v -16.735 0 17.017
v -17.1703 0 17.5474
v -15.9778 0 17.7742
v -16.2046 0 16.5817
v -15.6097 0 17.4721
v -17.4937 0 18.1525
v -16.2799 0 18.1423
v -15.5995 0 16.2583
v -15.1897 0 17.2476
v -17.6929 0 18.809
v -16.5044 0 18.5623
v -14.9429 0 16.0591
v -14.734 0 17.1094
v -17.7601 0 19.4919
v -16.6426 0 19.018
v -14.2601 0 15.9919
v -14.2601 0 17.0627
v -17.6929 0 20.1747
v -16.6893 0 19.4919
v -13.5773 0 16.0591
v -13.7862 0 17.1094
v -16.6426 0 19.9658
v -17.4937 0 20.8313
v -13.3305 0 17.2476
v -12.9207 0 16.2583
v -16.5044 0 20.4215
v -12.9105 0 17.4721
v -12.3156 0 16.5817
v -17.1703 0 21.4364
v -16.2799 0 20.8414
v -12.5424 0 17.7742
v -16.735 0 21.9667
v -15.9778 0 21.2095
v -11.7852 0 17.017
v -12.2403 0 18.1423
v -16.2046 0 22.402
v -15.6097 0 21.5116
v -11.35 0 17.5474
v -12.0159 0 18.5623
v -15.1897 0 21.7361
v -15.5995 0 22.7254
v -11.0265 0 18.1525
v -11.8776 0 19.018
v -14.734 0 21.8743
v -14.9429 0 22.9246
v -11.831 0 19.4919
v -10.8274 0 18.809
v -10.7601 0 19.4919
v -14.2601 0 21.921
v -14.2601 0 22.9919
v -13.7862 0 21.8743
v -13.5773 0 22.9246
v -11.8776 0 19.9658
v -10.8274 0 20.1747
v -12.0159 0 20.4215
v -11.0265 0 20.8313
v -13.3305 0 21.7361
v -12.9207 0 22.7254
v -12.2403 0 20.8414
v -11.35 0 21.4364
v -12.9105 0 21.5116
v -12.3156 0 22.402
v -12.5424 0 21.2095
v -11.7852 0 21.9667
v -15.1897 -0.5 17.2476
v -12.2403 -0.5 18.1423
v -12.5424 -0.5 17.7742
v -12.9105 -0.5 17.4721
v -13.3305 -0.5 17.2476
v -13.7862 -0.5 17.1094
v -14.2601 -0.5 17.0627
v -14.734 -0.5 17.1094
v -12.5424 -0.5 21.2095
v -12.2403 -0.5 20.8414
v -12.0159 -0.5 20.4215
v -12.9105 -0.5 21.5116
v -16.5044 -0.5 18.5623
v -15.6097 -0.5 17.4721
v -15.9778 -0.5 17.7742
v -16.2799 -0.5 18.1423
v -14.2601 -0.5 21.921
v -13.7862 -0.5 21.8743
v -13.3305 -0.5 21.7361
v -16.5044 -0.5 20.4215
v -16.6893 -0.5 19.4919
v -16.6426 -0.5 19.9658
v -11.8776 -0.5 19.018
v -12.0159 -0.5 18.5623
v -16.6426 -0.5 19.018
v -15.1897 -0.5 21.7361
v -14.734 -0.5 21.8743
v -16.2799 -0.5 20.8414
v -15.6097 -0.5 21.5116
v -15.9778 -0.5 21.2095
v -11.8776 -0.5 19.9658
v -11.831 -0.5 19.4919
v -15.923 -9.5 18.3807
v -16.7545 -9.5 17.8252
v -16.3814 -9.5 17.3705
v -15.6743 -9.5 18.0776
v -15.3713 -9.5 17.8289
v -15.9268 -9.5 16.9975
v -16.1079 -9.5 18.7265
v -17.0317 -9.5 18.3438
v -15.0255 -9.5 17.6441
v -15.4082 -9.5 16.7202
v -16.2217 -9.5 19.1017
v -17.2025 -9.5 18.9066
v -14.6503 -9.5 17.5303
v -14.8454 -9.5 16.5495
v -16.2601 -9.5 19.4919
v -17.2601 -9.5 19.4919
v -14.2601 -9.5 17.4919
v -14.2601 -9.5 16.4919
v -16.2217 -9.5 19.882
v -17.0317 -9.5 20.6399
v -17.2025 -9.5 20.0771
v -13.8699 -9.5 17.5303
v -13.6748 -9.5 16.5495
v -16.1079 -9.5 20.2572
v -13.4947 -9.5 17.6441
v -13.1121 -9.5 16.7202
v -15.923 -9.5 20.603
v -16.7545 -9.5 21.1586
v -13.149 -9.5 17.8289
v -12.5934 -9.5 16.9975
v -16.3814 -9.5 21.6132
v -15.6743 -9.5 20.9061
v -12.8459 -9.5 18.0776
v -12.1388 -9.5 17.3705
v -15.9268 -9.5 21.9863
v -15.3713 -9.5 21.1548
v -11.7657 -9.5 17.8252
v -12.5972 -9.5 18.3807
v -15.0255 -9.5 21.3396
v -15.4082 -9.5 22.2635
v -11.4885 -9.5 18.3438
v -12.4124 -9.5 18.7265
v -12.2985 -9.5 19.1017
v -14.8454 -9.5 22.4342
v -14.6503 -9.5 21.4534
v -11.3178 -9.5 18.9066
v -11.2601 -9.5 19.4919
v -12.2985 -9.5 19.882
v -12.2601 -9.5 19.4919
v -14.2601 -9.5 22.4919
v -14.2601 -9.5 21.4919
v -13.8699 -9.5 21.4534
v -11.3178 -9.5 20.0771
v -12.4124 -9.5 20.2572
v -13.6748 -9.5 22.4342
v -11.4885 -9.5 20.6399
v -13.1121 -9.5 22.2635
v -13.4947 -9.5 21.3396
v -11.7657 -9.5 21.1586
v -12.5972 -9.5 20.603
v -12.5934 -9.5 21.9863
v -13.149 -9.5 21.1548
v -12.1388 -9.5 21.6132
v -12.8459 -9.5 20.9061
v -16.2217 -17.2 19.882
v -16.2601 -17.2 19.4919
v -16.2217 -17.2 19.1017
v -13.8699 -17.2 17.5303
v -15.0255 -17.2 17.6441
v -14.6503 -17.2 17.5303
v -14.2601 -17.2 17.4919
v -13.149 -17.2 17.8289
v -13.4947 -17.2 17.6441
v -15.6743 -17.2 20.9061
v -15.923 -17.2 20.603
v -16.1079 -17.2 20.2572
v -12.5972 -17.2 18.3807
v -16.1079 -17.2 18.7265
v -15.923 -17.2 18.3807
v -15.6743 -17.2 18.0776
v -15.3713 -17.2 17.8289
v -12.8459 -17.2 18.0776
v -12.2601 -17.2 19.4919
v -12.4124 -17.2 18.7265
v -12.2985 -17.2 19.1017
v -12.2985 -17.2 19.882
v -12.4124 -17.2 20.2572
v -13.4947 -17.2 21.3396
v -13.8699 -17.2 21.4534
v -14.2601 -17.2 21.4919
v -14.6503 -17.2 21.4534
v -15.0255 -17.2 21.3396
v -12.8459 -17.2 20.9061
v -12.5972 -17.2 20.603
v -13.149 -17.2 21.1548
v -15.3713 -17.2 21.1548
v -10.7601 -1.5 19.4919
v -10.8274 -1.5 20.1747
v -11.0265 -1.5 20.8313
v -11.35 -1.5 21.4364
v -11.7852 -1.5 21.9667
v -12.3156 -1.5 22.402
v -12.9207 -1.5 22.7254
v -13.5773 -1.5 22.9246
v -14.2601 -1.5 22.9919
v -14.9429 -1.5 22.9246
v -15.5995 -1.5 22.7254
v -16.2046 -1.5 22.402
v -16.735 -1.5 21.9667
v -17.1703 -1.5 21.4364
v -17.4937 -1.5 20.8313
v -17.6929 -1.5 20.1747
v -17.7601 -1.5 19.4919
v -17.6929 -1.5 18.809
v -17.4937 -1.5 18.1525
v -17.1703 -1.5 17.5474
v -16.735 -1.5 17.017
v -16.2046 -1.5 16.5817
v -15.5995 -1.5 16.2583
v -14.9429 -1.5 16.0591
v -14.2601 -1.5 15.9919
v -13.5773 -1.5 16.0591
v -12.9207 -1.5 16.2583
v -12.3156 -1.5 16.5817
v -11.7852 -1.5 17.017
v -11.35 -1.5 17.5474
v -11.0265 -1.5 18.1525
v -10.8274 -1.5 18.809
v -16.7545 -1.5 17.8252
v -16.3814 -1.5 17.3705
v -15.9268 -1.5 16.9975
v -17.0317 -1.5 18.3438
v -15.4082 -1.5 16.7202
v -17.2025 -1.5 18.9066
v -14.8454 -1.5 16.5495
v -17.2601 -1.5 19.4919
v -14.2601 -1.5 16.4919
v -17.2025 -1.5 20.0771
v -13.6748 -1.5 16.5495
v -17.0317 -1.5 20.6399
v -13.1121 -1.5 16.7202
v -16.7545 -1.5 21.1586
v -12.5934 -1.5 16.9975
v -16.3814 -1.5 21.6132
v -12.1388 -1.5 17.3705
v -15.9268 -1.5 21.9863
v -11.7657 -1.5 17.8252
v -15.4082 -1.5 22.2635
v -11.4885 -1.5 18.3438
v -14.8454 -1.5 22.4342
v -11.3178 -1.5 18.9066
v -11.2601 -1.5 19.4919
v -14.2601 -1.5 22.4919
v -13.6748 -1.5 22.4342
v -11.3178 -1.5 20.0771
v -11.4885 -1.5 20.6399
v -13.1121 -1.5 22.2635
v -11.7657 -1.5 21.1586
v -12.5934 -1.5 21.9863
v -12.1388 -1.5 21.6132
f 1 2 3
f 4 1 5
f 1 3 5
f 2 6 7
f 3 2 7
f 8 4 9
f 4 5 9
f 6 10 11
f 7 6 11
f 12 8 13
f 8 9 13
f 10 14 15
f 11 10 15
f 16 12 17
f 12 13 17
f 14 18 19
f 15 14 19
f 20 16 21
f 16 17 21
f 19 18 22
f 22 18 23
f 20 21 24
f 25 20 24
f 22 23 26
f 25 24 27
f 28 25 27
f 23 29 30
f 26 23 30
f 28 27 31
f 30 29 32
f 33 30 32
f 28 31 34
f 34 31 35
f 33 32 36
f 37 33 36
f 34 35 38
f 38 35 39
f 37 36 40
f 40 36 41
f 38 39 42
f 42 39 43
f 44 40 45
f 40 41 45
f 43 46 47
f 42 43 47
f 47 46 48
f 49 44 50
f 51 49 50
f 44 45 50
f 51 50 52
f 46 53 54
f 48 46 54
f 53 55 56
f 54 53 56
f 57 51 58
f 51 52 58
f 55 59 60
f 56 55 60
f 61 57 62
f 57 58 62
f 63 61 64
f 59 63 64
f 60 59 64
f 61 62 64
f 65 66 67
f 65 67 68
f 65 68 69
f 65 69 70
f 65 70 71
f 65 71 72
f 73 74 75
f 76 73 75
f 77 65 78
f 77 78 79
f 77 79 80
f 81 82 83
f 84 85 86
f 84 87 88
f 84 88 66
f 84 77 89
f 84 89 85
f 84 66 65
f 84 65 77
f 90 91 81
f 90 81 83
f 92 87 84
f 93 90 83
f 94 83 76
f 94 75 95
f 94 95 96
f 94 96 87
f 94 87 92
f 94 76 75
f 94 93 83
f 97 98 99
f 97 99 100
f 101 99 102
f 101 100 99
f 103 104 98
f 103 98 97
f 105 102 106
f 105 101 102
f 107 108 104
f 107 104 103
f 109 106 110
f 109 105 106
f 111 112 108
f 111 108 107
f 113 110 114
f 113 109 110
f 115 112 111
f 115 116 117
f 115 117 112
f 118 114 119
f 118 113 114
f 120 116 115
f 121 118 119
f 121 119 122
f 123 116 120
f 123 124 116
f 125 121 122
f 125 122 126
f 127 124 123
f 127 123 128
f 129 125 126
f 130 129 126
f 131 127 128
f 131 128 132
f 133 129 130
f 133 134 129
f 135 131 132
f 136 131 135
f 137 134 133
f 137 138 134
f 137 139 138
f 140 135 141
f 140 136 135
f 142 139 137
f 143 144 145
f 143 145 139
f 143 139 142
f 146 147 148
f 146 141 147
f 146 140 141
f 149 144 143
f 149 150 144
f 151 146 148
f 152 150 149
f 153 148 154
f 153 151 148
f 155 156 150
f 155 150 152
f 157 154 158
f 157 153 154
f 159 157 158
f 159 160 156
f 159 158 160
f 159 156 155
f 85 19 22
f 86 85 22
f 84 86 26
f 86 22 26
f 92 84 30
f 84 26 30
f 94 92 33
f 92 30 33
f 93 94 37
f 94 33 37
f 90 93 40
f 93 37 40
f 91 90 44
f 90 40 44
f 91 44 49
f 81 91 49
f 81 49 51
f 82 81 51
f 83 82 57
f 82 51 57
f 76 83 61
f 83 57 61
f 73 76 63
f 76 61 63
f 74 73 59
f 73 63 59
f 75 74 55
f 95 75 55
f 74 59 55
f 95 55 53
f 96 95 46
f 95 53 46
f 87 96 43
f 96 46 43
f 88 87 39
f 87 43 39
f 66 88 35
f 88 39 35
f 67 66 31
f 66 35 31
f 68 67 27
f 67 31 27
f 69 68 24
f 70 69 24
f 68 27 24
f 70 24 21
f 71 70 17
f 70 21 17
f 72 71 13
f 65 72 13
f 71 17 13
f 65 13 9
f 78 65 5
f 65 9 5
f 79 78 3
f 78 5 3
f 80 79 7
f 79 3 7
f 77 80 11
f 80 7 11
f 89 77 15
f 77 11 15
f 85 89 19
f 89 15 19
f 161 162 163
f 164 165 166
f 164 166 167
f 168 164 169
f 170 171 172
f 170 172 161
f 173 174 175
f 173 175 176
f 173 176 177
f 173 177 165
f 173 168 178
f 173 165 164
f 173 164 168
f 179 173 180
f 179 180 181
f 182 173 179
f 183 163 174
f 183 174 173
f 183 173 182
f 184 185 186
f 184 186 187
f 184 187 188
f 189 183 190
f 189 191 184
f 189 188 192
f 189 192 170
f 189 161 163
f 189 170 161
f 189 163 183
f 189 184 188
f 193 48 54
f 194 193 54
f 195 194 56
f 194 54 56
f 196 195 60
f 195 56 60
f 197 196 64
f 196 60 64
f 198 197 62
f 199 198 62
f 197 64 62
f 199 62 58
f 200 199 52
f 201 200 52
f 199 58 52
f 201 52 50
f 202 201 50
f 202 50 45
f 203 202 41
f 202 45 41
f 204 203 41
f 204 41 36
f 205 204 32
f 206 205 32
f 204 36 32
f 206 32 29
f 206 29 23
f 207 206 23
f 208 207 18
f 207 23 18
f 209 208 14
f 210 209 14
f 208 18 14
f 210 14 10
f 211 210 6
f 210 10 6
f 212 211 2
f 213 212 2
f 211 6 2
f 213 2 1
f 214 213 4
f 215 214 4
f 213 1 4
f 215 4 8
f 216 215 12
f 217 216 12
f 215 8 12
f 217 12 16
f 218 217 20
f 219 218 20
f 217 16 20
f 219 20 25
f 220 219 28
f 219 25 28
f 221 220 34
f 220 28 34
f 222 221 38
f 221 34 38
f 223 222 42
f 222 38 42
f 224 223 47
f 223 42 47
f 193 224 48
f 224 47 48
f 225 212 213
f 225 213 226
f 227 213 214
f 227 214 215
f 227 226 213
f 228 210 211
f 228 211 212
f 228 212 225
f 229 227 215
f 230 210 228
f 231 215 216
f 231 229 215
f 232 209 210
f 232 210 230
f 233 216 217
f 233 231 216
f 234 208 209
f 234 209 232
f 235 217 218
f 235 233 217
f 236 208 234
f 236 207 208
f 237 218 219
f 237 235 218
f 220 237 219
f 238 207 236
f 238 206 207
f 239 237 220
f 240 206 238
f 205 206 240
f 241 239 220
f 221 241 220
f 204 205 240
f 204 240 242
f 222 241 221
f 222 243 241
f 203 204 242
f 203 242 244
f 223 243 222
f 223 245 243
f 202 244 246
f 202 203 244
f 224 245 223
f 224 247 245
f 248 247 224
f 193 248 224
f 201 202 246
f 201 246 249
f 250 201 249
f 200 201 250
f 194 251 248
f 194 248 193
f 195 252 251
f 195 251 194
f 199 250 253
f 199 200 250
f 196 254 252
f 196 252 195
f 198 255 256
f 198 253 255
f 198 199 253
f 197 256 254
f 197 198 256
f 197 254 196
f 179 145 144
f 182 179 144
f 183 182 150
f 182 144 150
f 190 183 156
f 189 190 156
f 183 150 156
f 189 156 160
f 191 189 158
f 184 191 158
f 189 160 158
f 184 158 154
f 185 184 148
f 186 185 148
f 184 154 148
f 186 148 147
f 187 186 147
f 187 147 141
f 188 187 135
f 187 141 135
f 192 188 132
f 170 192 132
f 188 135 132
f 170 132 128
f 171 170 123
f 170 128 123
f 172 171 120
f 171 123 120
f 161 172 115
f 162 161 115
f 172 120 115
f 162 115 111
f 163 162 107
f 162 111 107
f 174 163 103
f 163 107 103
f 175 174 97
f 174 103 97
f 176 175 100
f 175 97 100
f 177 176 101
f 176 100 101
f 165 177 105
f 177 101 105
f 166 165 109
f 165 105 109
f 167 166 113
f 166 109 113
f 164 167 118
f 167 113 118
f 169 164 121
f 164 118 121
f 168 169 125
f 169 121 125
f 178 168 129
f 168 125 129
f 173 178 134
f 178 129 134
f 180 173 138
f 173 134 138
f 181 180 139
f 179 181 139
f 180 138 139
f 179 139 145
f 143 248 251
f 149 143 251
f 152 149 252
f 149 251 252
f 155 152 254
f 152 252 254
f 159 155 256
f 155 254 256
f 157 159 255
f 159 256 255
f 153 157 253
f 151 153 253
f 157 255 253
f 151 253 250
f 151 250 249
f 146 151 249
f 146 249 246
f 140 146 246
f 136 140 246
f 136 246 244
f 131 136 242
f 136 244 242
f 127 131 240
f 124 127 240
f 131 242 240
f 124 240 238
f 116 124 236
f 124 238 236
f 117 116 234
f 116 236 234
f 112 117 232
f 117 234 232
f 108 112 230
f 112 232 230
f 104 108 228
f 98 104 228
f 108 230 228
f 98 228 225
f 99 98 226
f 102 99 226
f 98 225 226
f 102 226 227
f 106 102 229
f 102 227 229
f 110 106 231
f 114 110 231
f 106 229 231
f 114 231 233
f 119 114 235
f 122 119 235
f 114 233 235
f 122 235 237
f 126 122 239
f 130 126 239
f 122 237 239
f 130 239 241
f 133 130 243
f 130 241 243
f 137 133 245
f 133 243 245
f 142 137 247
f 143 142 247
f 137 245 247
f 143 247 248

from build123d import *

# Parameters (mm, degrees)
F0_R     = 3.5
F1_DEPTH = 1.5
F2_R     = 3
F3_DEPTH = 8
F4_R     = 2
F5_DEPTH = 7.7
F6_R     = 2.429154
F7_DEPTH = 0.5


with BuildPart() as f1:
    # F0 (on Front) → F1 (new body)
    with BuildSketch(Plane.XZ):
        with Locations((-14.26011, 19.491863)):
            Circle(F0_R)
    extrude(amount=F1_DEPTH)

    # F2 (on face) → F3 (join)
    with BuildSketch(Plane.XZ.offset(1.5)):
        with Locations((-14.26011, 19.491863)):
            Circle(F2_R)
    extrude(amount=F3_DEPTH)

    # F4 (on face) → F5 (join)
    with BuildSketch(Plane.XZ.offset(9.5)):
        with Locations((-14.26011, 19.491863)):
            Circle(F4_R)
    extrude(amount=F5_DEPTH)

    # F6 (on face) → F7 (cut)
    with BuildSketch(Plane(origin=(0, 0, 0), x_dir=(-1, 0, 0), z_dir=(0, 1, 0))):
        with Locations((14.26011, 19.491863)):
            Circle(F6_R)
    extrude(amount=-F7_DEPTH, mode=Mode.SUBTRACT)


solid = f1.part
